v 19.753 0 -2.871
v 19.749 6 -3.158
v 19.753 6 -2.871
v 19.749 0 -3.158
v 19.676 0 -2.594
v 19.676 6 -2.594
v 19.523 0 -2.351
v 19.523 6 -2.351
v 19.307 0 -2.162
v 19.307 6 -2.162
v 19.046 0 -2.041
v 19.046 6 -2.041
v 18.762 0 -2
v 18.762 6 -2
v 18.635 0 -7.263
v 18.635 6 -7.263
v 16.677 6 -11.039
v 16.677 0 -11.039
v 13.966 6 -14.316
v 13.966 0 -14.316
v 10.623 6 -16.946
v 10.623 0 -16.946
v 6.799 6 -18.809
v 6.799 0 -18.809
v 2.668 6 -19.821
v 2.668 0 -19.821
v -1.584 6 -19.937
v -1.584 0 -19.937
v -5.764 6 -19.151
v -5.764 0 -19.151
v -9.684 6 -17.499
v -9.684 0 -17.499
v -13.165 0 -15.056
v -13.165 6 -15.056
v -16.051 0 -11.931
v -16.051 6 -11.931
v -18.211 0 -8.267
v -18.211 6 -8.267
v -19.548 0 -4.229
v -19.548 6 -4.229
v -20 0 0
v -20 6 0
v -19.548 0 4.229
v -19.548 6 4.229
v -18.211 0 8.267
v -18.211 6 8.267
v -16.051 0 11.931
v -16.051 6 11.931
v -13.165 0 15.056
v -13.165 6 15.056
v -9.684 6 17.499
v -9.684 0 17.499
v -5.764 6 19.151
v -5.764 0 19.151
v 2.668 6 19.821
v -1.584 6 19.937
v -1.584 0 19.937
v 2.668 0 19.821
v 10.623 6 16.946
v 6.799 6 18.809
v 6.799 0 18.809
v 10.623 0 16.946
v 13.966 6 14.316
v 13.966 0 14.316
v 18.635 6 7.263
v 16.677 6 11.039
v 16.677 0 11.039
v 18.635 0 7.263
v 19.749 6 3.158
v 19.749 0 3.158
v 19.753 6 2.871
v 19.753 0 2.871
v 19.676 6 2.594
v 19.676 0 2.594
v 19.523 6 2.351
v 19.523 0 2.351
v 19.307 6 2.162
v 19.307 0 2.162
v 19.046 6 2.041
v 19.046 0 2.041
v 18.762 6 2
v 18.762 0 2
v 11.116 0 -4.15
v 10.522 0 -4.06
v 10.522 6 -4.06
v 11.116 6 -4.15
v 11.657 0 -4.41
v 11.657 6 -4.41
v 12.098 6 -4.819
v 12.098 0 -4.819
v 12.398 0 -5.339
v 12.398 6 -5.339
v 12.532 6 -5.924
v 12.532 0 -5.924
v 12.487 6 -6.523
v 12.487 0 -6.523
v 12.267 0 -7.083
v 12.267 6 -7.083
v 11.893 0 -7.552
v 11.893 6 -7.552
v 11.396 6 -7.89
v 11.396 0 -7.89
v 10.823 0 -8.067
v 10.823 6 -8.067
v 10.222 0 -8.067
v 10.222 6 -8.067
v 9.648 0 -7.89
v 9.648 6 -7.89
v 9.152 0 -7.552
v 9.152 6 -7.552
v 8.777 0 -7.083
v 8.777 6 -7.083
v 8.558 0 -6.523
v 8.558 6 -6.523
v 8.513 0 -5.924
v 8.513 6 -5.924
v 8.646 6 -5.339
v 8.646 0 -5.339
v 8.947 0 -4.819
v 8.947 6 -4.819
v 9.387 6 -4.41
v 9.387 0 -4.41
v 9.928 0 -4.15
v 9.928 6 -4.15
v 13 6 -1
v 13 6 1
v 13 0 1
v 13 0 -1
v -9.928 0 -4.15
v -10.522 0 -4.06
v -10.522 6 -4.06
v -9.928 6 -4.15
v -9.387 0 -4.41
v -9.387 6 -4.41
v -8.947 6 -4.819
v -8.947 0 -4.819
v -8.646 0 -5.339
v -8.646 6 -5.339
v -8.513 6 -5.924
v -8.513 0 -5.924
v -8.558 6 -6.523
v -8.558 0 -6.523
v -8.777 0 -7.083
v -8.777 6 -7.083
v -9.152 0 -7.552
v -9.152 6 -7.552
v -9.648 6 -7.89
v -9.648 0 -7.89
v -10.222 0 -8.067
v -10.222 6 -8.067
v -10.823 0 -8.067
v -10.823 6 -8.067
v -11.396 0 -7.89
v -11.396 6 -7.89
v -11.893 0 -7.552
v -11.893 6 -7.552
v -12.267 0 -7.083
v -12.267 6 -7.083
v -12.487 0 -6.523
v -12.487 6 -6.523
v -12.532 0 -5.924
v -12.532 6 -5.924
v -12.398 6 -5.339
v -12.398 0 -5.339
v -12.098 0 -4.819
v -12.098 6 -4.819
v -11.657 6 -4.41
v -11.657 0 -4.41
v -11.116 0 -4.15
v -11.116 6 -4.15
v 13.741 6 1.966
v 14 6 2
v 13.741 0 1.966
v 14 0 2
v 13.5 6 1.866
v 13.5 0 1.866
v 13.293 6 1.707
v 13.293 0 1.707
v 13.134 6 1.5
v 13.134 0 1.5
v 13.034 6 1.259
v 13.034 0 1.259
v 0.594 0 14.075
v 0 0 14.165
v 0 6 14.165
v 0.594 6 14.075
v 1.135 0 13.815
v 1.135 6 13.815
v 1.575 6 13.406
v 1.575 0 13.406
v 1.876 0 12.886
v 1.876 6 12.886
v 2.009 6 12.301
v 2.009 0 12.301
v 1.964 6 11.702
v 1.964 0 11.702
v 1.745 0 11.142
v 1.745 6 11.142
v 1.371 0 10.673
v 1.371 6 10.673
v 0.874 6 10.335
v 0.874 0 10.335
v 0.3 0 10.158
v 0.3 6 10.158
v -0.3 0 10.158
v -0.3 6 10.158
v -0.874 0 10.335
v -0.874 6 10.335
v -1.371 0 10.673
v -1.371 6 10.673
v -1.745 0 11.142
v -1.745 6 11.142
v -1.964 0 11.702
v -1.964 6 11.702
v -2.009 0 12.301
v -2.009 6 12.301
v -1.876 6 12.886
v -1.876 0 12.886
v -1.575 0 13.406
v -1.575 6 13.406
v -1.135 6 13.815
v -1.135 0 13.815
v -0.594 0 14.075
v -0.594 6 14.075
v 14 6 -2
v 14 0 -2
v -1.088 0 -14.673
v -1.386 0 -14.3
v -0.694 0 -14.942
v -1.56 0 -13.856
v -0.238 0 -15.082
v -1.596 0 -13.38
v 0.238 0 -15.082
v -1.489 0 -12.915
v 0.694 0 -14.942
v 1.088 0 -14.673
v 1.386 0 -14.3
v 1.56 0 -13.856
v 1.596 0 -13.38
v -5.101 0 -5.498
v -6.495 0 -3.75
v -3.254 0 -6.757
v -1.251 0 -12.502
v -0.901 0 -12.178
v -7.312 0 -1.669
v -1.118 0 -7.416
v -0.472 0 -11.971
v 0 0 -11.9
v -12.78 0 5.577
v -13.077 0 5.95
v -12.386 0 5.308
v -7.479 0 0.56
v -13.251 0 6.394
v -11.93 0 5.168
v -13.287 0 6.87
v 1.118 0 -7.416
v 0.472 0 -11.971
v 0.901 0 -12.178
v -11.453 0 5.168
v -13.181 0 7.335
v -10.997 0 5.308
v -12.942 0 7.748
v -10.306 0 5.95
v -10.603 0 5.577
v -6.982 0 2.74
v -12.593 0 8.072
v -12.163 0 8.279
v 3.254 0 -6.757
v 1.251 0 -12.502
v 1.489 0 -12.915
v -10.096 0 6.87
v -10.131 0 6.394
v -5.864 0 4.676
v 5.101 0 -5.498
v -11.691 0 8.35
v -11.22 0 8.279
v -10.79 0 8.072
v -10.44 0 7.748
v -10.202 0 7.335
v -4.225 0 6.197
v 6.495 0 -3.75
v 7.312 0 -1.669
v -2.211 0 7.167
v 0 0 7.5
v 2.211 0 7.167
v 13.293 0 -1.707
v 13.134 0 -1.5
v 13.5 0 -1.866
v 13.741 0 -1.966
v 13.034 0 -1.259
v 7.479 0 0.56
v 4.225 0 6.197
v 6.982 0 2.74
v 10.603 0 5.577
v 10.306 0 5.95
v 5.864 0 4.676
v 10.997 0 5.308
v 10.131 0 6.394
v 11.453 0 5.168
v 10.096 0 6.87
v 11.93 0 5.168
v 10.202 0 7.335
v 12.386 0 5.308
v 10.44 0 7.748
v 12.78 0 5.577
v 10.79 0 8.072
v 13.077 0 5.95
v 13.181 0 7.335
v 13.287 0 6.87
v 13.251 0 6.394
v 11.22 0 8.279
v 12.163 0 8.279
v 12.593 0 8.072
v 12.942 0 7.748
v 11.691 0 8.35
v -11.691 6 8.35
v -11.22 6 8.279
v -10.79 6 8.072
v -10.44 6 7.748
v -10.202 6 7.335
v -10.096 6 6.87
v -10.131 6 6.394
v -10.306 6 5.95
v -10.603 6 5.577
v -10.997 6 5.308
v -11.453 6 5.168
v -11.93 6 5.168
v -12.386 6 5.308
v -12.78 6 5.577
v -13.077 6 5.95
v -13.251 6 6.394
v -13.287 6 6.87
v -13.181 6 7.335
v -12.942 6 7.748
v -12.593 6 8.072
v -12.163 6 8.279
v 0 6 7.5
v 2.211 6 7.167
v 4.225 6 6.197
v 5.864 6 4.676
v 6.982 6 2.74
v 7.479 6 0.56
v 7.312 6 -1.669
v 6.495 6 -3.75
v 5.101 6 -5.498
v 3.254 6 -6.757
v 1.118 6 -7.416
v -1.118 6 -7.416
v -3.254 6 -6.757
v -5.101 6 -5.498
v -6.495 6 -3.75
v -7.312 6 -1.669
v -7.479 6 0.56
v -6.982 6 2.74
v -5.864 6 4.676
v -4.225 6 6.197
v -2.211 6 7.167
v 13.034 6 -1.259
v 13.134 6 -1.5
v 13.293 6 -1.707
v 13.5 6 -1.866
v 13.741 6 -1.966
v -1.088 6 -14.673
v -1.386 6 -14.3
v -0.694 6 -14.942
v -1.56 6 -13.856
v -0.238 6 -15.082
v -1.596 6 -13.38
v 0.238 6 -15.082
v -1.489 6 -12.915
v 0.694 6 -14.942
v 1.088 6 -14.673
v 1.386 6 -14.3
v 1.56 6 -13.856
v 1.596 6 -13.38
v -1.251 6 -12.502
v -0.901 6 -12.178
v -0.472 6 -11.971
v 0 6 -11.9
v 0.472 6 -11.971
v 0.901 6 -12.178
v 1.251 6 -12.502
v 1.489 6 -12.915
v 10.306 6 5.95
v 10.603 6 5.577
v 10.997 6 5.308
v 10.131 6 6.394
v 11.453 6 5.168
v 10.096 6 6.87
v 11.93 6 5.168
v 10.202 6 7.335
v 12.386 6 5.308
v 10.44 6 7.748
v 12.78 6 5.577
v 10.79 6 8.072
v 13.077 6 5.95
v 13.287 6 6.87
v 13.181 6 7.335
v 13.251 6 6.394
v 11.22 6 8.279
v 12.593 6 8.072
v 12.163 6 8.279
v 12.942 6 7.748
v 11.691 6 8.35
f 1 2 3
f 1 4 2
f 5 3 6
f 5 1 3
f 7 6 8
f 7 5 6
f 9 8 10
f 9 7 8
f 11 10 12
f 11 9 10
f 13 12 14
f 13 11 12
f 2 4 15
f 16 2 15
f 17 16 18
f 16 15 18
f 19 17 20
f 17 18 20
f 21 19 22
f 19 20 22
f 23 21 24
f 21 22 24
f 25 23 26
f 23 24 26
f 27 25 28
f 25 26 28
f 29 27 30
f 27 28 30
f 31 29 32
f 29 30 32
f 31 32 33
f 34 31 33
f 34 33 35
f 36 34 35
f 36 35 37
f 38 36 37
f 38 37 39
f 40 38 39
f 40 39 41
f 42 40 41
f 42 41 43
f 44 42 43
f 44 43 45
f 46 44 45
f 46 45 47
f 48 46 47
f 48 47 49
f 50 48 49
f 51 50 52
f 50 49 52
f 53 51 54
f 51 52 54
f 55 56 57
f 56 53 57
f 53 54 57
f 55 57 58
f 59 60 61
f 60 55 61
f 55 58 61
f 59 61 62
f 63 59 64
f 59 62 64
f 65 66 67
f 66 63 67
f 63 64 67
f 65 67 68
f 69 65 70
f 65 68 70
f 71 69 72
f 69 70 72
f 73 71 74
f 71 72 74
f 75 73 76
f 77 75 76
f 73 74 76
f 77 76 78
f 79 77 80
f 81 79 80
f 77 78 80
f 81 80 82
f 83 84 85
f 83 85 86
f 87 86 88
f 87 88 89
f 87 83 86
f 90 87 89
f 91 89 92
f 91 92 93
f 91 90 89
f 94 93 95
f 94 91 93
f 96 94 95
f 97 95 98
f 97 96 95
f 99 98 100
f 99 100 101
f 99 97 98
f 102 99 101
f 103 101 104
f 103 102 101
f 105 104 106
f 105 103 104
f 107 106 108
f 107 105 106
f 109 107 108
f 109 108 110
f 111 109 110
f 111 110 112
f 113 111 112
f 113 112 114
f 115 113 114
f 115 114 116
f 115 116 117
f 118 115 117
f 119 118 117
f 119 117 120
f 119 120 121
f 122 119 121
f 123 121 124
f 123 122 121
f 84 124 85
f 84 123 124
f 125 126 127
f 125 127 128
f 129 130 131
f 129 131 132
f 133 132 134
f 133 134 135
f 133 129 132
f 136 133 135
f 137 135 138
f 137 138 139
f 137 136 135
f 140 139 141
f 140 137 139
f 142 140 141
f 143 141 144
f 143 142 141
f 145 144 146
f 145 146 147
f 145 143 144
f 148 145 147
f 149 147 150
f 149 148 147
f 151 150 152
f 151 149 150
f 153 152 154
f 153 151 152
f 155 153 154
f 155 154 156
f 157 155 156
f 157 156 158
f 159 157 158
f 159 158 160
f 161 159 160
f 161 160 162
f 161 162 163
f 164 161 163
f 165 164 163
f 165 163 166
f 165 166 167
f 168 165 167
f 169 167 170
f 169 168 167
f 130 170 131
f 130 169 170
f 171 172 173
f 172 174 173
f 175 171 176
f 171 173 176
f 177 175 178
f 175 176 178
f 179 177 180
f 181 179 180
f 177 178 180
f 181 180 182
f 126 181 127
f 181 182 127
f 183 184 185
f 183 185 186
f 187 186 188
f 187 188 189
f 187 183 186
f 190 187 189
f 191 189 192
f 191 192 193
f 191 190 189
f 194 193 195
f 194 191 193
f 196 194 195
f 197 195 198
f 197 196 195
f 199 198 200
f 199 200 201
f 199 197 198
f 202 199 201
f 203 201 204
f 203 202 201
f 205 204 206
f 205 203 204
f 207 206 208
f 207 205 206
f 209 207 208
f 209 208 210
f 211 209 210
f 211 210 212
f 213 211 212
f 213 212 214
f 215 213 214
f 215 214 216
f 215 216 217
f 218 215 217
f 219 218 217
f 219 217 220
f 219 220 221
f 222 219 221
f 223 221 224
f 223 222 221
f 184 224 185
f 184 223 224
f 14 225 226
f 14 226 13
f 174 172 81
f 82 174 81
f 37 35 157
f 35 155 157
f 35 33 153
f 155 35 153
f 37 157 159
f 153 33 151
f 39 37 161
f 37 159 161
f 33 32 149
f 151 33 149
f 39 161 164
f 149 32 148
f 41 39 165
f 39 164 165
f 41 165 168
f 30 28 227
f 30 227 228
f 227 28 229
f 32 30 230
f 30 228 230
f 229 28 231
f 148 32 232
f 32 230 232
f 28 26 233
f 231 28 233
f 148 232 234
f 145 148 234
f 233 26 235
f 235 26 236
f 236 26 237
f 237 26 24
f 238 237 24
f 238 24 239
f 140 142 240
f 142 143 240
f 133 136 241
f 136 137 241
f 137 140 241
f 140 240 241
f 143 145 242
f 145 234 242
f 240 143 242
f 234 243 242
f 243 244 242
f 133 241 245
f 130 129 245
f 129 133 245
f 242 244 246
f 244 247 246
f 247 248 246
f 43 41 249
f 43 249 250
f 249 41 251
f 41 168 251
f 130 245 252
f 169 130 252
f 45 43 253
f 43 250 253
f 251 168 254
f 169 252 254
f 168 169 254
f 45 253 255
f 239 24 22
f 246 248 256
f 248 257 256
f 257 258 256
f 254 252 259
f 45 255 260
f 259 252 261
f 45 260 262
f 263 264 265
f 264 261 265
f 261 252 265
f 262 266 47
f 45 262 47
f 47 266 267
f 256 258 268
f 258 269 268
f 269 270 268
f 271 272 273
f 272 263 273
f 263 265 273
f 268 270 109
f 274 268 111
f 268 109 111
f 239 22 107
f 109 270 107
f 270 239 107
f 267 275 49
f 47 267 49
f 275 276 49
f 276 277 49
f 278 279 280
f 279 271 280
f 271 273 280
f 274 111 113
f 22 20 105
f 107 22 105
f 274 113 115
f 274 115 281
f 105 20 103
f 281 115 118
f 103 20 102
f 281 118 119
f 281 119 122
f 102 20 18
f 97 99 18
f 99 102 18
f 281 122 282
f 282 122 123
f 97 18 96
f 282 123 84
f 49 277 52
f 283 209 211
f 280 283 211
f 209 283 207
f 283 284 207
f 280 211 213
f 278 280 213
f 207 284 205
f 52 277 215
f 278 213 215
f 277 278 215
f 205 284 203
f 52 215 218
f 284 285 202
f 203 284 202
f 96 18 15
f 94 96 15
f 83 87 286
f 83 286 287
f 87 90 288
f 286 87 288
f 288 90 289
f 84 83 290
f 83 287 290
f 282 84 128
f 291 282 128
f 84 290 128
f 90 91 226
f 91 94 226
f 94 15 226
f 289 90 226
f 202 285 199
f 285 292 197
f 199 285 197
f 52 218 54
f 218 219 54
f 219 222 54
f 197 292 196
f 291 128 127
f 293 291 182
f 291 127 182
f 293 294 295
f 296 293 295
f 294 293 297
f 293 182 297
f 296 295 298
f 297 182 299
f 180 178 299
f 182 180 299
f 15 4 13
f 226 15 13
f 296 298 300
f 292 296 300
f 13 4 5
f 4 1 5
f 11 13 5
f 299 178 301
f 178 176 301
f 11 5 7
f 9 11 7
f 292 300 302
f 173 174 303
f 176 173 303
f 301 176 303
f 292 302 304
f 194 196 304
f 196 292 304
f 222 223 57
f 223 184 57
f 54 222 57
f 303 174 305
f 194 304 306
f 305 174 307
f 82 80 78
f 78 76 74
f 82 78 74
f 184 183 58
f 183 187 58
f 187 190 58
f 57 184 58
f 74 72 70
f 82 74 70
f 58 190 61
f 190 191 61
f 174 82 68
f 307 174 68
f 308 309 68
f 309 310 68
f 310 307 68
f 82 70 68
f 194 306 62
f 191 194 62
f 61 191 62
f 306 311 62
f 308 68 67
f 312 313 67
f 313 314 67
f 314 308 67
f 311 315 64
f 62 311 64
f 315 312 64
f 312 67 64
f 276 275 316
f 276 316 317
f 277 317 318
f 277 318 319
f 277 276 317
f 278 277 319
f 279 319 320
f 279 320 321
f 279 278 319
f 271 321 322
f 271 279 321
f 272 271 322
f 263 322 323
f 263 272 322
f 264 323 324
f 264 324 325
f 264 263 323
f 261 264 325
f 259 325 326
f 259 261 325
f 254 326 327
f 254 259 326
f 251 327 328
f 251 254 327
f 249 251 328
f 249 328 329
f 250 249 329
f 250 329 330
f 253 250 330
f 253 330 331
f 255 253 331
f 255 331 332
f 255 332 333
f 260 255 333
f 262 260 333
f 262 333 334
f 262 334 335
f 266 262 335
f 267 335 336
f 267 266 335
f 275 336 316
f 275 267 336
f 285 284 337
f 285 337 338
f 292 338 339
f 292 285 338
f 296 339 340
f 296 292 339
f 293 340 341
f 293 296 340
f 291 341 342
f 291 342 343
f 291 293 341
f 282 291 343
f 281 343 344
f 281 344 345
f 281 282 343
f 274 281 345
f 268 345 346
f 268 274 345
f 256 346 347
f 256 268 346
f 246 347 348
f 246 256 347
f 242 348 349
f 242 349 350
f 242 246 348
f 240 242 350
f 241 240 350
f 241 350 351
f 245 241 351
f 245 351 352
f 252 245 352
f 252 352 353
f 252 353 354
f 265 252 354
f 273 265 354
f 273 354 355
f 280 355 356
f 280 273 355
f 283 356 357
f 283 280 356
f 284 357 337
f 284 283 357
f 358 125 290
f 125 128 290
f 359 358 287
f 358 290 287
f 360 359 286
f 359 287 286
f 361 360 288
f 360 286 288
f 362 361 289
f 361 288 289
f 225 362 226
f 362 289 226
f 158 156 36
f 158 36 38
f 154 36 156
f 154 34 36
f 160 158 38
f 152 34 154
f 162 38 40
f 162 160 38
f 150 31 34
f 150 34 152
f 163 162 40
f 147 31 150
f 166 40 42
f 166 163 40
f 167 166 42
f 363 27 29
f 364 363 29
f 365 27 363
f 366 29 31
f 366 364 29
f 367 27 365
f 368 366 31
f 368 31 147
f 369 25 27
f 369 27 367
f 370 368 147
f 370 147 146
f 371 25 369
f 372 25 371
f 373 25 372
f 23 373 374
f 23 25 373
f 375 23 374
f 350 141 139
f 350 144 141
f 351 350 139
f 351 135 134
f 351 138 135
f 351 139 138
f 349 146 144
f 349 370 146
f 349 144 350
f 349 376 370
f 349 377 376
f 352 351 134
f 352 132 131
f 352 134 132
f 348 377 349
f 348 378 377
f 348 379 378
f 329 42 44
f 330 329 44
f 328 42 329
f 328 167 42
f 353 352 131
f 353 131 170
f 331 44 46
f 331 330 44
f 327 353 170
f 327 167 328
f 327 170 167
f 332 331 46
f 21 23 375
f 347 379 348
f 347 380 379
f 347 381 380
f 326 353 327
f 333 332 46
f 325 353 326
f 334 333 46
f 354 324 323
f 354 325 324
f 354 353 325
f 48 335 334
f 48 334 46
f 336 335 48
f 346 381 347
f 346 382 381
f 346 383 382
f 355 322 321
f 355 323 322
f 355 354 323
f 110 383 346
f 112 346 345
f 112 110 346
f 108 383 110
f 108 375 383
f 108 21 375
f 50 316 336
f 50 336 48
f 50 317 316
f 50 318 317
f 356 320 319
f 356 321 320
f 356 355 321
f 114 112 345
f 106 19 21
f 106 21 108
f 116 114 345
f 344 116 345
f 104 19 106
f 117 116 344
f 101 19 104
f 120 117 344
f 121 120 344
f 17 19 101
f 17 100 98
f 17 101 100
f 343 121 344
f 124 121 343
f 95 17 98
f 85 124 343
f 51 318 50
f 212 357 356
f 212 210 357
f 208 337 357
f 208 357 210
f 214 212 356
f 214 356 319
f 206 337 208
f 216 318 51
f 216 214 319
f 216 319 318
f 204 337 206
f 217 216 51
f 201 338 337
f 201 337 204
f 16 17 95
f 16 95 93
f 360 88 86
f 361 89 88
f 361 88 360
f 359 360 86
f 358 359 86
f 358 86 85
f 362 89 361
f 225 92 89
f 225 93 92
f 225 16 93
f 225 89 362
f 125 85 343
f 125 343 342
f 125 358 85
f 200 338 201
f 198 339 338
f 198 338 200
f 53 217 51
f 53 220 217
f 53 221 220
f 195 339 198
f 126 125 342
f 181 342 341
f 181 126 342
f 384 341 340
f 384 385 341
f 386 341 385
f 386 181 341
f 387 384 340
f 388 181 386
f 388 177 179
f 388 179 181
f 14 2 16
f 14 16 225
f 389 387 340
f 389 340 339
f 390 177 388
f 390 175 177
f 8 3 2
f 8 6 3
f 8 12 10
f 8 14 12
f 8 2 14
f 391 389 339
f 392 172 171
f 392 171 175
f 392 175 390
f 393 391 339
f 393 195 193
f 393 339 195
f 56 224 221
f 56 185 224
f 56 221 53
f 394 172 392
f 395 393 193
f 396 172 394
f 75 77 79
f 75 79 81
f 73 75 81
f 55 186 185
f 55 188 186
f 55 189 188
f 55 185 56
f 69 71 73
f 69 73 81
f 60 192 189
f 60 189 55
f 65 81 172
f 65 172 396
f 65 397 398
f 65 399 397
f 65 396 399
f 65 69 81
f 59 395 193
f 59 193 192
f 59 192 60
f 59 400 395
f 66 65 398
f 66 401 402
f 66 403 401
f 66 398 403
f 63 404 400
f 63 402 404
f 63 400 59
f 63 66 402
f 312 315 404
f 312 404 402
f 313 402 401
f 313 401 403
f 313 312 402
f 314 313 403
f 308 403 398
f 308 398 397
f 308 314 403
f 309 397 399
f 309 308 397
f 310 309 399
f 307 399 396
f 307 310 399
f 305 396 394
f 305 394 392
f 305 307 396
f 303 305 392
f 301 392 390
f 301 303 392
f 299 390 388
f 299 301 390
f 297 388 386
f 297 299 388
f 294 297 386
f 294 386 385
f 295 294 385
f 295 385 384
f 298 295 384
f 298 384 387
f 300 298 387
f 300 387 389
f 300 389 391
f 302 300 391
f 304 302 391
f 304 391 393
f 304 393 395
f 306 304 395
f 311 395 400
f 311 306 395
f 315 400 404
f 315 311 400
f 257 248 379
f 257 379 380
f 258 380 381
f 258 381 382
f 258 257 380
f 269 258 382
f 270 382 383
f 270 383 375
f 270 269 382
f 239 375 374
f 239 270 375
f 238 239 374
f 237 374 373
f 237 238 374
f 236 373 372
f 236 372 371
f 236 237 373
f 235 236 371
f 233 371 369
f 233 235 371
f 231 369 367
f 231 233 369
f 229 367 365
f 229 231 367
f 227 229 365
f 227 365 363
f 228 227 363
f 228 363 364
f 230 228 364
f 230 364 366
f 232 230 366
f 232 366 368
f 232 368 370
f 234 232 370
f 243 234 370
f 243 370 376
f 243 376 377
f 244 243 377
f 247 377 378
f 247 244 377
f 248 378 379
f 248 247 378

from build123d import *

# Parameters (mm, degrees)
SKETCH_1_R          = 20
SKETCH_1_R_2        = 2.015
SKETCH_1_R_3        = 7.5
SKETCH_1_R_4        = 1.6
EXTRUDE_1_DEPTH     = 6
SKETCH_2_W          = 14.17824661
SKETCH_2_H          = 4
CUT_EXTRUDE_1_DEPTH = 10
FILLET_1_R          = 1


with BuildPart() as part:
    # 草图1 → 凸台-拉伸1 (new body)
    with BuildSketch(Plane(origin=(0, 0, 0), x_dir=(1, 0, 0), z_dir=(0, 1, 0))):
        with Locations(Location((0, 0, 0), (0, 0, 270))):
            Circle(SKETCH_1_R)
        with Locations(Location((0, -12.15, 0), (0, 0, 270))):
            Circle(SKETCH_1_R_2, mode=Mode.SUBTRACT)
        with Locations(Location((10.522208656, 6.075, 0), (0, 0, 270))):
            Circle(SKETCH_1_R_2, mode=Mode.SUBTRACT)
        with Locations(Location((-10.522208656, 6.075, 0), (0, 0, 270))):
            Circle(SKETCH_1_R_2, mode=Mode.SUBTRACT)
        with Locations(Location((0, 0, 0), (0, 0, 270))):
            Circle(SKETCH_1_R_3, mode=Mode.SUBTRACT)
        with Locations(Location((-11.691342951, -6.75, 0), (0, 0, 270))):
            Circle(SKETCH_1_R_4, mode=Mode.SUBTRACT)
        with Locations(Location((11.691342951, -6.75, 0), (0, 0, 270))):
            Circle(SKETCH_1_R_4, mode=Mode.SUBTRACT)
        with Locations(Location((0, 13.5, 0), (0, 0, 270))):
            Circle(SKETCH_1_R_4, mode=Mode.SUBTRACT)
    extrude(amount=EXTRUDE_1_DEPTH)

    # 草图2 → 切除-拉伸1 (cut)
    with BuildSketch(Plane(origin=(0, 6, 0), x_dir=(1, 0, 0), z_dir=(0, 1, 0))):
        with Locations((20.089123305, 0)):
            Rectangle(SKETCH_2_W, SKETCH_2_H)
    extrude(amount=-CUT_EXTRUDE_1_DEPTH, mode=Mode.SUBTRACT)

    # 圆角1
    fillet_1_edges = [part.edges().sort_by_distance(p)[0] for p in [
        (13, 3, 2),
        (19.899748742, 3, -2),
        (13, 3, -2),
        (19.899748742, 3, 2),
    ]]
    fillet(fillet_1_edges, radius=FILLET_1_R)


solid = part.part
